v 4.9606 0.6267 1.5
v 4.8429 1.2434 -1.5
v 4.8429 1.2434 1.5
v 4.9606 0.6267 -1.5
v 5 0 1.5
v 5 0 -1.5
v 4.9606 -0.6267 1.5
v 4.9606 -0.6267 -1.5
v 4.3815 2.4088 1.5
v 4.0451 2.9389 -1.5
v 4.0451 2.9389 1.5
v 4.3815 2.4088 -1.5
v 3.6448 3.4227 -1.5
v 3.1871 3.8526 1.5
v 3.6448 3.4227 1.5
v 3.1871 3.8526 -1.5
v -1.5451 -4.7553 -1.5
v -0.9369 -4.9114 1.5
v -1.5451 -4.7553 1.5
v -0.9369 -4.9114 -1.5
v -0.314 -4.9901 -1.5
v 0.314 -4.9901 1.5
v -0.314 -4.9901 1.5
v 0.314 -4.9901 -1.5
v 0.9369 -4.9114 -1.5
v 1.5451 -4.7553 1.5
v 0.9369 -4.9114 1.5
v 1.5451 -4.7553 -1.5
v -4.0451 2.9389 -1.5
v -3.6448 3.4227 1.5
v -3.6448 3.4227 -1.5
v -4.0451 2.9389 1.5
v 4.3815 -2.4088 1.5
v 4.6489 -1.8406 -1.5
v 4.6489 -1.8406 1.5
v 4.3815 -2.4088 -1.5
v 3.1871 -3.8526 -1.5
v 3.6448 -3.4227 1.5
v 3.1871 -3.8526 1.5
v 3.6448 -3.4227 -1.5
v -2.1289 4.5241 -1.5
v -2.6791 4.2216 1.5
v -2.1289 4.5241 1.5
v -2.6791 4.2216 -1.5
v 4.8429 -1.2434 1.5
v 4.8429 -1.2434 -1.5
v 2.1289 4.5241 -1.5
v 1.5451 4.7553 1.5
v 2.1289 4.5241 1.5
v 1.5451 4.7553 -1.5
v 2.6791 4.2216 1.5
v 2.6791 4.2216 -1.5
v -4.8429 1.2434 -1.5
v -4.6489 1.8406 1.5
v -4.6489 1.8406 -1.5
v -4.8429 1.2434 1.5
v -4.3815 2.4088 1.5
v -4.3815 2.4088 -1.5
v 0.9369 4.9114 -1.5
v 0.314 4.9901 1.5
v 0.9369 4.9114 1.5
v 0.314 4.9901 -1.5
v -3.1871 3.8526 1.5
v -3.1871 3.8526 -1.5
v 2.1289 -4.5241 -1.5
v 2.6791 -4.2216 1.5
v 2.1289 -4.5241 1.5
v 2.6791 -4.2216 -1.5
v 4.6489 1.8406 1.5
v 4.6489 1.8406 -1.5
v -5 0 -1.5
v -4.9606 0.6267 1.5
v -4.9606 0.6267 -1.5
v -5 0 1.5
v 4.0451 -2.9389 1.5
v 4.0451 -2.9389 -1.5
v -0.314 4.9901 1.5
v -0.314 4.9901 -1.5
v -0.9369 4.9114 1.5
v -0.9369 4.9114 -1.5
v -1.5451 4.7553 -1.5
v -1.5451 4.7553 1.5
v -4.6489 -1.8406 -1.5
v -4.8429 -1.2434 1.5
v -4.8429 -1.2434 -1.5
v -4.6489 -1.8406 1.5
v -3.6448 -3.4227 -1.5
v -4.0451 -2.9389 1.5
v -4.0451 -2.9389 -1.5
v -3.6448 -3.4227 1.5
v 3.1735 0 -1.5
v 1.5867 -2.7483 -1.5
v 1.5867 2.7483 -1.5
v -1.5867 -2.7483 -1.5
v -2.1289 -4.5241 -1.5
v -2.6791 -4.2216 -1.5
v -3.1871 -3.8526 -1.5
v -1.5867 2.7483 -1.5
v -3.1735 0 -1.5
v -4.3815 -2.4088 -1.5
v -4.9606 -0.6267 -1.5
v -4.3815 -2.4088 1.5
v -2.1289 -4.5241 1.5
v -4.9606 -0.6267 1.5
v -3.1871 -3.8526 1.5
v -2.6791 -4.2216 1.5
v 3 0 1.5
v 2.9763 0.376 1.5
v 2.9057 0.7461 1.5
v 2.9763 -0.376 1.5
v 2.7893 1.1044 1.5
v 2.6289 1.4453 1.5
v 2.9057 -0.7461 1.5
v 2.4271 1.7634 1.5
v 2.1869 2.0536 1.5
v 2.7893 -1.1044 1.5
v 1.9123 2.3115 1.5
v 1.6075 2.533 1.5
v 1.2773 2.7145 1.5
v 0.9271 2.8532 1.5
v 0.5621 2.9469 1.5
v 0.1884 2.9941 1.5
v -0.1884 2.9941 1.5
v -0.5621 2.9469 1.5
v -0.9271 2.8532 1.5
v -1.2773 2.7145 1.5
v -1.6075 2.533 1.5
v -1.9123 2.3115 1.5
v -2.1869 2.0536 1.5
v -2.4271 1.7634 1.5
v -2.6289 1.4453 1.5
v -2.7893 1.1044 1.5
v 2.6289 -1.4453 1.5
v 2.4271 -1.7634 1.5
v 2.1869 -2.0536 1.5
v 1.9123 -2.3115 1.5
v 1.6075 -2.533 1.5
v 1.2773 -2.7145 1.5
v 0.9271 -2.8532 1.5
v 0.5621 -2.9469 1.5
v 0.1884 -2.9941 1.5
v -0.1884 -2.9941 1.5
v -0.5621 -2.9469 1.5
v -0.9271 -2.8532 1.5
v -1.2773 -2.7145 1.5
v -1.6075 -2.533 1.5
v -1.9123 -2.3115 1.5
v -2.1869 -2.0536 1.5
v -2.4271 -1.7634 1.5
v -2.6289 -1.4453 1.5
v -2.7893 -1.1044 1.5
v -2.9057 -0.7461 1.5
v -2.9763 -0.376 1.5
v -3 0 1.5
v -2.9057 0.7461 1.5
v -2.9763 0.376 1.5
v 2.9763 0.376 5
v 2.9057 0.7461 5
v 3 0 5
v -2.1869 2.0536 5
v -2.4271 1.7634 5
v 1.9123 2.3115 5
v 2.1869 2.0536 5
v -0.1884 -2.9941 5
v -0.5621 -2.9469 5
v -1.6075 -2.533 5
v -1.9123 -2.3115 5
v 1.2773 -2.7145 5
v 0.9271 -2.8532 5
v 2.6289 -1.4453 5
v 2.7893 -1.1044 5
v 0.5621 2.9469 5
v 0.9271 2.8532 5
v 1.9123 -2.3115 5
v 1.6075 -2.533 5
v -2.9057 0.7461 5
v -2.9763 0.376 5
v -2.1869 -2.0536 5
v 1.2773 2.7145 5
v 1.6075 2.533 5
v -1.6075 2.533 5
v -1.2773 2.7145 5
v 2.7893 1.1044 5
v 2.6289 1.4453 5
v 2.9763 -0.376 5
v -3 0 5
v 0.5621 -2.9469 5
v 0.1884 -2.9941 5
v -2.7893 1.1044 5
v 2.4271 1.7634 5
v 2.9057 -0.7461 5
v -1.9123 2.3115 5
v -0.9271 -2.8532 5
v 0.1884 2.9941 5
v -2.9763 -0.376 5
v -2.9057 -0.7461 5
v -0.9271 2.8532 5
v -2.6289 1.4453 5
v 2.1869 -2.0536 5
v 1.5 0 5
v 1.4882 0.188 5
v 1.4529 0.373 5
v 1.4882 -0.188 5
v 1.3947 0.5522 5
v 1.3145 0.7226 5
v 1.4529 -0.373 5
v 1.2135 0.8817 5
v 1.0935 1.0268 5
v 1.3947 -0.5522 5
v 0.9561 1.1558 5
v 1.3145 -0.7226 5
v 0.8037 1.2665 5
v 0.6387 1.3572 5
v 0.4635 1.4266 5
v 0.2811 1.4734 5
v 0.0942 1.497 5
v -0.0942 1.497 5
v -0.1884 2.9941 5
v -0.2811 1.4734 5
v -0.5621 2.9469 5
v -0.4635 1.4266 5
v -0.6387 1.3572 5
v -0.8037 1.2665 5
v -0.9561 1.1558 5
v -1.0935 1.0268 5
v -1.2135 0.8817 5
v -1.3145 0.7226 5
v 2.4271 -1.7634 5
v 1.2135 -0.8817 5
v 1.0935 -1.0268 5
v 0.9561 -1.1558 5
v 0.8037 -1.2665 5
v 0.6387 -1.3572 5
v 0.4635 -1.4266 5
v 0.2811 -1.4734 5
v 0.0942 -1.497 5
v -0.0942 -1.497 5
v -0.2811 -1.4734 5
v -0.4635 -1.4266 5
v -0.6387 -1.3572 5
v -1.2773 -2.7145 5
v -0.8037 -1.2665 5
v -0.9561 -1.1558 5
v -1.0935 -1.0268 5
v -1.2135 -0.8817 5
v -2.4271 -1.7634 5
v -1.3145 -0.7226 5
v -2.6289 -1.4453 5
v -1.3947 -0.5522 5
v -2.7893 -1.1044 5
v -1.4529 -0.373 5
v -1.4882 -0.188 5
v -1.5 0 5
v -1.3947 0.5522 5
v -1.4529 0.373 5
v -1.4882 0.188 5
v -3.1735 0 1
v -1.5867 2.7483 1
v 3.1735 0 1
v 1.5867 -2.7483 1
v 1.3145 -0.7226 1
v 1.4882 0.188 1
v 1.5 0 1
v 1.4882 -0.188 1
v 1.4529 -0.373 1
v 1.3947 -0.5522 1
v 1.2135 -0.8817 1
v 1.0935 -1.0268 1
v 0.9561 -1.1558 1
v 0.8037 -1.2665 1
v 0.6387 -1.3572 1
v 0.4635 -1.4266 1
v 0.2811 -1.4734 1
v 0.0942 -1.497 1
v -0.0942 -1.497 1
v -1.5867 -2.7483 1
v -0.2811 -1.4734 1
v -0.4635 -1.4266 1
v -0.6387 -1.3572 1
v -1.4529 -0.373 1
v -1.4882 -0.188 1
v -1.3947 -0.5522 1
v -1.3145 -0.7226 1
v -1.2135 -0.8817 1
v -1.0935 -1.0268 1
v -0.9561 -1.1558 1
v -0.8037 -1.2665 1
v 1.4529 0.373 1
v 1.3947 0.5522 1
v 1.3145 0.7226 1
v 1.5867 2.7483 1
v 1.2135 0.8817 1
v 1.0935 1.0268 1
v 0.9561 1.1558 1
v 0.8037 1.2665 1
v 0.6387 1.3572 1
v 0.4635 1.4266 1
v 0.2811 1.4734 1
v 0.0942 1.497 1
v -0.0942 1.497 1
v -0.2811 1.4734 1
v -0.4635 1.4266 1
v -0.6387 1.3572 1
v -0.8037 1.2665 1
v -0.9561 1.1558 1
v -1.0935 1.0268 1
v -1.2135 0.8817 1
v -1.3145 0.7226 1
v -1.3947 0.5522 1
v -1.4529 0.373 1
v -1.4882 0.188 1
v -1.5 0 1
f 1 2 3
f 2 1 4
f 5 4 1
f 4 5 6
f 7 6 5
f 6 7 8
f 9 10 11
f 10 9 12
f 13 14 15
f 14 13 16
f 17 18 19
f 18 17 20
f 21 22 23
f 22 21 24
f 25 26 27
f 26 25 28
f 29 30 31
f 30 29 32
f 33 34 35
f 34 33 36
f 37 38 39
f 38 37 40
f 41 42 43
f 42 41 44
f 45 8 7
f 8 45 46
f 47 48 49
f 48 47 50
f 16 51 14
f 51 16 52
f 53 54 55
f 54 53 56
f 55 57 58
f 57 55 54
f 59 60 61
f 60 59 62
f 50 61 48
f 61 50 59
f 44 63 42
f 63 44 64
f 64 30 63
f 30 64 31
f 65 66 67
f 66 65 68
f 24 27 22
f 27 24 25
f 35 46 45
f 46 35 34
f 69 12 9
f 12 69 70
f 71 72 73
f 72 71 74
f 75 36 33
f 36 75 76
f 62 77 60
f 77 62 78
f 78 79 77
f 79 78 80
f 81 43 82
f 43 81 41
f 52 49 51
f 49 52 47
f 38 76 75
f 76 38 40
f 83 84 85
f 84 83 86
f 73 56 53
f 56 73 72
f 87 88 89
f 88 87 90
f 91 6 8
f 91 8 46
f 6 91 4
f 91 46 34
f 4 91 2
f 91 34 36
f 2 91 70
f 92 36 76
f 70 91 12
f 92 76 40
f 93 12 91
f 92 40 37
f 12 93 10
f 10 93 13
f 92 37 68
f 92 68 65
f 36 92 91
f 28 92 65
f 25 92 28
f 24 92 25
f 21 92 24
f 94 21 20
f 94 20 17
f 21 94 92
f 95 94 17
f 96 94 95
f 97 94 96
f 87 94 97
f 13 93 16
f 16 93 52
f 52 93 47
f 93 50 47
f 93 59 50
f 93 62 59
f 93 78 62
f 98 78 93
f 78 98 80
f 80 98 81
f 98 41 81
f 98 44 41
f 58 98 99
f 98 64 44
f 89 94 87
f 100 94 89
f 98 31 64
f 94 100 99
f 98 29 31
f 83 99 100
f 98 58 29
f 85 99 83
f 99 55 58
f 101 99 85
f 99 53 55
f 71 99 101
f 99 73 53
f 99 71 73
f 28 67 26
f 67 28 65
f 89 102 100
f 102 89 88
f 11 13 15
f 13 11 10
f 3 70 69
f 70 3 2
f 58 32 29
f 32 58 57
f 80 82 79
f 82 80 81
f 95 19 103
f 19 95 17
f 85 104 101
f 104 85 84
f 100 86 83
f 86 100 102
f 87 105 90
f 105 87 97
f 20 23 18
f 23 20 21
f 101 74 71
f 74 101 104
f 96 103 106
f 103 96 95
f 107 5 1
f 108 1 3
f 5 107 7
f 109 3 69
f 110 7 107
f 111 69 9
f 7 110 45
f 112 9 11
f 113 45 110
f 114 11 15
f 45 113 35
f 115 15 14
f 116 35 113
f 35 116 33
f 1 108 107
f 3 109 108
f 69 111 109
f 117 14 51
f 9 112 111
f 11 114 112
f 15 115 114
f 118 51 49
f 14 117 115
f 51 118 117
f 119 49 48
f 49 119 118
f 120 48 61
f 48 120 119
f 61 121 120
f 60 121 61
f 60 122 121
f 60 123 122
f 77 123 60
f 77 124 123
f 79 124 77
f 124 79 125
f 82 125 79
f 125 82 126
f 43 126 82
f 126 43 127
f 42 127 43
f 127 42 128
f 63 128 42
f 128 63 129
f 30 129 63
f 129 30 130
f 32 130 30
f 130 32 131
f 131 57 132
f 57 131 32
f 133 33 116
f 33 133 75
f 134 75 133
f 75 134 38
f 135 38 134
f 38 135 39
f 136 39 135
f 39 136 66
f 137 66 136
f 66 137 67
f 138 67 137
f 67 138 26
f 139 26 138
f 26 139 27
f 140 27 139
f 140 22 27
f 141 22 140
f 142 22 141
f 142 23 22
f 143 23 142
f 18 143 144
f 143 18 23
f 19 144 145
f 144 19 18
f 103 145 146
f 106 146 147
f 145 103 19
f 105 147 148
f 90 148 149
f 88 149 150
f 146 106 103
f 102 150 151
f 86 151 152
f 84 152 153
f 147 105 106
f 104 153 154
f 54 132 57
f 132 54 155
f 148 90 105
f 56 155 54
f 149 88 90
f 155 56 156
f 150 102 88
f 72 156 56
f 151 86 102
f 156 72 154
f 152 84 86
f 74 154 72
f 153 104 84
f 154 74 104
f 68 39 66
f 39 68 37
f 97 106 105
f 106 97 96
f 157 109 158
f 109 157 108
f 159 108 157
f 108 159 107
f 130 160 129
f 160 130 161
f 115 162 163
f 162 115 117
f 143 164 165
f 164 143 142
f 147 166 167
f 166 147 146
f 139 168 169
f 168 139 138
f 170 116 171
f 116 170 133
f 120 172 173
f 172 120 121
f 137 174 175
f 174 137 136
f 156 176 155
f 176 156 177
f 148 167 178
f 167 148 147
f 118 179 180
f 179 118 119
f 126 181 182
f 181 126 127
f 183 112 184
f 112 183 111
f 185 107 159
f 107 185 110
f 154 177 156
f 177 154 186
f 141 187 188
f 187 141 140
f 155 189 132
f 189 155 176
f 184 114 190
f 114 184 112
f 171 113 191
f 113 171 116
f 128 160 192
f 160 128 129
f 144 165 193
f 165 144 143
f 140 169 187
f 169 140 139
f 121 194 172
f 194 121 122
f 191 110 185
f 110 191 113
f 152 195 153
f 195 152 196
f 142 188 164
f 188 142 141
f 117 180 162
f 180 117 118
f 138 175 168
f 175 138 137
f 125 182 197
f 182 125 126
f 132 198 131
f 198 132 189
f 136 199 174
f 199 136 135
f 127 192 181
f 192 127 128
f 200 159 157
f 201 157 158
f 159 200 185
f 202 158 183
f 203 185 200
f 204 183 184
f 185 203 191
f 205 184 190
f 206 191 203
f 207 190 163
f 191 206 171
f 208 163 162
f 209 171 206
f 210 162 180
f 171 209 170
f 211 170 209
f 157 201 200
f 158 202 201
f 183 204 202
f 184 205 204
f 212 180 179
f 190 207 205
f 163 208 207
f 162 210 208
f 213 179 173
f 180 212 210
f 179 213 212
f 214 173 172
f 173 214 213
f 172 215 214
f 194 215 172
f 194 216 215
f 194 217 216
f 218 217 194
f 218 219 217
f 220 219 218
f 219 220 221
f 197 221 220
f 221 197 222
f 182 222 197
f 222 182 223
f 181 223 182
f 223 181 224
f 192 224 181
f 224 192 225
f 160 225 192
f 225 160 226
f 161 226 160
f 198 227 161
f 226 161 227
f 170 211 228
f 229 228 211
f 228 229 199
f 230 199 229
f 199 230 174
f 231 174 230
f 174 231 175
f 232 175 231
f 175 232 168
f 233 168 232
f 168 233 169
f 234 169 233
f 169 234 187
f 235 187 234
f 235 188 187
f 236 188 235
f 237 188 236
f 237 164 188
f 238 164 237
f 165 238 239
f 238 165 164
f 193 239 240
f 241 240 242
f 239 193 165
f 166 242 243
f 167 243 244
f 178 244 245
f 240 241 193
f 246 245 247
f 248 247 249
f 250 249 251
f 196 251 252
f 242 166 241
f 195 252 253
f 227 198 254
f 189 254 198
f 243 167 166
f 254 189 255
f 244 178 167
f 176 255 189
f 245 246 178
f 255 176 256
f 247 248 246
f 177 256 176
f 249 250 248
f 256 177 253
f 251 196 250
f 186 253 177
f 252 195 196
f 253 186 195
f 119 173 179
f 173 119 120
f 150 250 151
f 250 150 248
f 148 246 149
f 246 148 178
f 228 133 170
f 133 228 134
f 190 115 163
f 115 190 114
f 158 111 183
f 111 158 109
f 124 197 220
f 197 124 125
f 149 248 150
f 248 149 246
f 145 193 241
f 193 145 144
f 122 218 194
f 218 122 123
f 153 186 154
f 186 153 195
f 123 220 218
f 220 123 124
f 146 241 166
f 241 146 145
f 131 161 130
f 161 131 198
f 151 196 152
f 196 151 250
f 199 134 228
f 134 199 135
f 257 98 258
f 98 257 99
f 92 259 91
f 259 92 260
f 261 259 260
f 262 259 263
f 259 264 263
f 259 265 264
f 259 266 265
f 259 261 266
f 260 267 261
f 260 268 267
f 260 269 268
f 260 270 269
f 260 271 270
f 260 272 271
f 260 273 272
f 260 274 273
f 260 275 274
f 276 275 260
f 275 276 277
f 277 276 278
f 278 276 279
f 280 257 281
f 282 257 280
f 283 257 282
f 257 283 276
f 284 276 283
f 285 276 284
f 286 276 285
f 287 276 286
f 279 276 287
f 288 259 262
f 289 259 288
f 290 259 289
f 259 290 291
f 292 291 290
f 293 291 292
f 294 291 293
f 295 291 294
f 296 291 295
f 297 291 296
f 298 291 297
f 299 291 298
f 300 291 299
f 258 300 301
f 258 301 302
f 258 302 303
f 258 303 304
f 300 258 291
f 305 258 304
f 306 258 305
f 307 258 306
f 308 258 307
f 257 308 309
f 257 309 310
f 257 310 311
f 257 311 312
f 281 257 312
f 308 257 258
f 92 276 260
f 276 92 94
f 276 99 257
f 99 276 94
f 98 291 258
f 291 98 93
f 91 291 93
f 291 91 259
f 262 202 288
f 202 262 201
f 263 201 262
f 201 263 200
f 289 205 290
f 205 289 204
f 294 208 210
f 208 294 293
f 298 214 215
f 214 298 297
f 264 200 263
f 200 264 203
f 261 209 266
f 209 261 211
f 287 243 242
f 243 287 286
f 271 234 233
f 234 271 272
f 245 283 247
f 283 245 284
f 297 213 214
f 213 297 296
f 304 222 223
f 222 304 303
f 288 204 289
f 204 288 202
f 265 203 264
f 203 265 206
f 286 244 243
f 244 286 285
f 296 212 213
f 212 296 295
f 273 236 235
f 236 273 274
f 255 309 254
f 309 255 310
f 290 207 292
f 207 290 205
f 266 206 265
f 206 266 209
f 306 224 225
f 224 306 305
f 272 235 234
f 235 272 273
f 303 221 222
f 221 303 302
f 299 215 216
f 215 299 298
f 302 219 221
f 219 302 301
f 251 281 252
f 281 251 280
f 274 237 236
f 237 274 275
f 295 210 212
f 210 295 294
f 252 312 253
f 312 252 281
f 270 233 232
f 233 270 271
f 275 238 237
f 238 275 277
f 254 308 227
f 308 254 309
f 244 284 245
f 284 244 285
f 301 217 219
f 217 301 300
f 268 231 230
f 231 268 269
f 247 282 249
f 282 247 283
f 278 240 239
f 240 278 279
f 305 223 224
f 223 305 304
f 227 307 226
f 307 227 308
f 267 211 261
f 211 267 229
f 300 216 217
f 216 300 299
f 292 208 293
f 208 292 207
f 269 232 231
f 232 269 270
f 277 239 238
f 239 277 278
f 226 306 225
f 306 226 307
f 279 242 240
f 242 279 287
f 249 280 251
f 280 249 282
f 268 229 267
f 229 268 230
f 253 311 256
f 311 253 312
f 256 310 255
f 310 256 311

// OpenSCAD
$fn = 50;


difference() {
	union() {
		translate(v = [0, 0, -1.5000000000]) {
			cylinder(h = 3, r = 5.0000000000);
		}
		translate(v = [0, 0, -1.5000000000]) {
			cylinder(h = 6.5000000000, r = 3.0000000000);
		}
	}
	union() {
		translate(v = [0, 0, -1.5000000000]) {
			rotate(a = [0, 0, 0]) {
				difference() {
					union() {
						linear_extrude(height = 2.5000000000) {
							polygon(points = [[3.1735000000, 0.0000000000], [1.5867500000, 2.7483316189], [-1.5867500000, 2.7483316189], [-3.1735000000, 0.0000000000], [-1.5867500000, -2.7483316189], [1.5867500000, -2.7483316189]]);
						}
					}
					union();
				}
			}
		}
		translate(v = [0, 0, -100.0000000000]) {
			cylinder(h = 200, r = 1.5000000000);
		}
	}
}
